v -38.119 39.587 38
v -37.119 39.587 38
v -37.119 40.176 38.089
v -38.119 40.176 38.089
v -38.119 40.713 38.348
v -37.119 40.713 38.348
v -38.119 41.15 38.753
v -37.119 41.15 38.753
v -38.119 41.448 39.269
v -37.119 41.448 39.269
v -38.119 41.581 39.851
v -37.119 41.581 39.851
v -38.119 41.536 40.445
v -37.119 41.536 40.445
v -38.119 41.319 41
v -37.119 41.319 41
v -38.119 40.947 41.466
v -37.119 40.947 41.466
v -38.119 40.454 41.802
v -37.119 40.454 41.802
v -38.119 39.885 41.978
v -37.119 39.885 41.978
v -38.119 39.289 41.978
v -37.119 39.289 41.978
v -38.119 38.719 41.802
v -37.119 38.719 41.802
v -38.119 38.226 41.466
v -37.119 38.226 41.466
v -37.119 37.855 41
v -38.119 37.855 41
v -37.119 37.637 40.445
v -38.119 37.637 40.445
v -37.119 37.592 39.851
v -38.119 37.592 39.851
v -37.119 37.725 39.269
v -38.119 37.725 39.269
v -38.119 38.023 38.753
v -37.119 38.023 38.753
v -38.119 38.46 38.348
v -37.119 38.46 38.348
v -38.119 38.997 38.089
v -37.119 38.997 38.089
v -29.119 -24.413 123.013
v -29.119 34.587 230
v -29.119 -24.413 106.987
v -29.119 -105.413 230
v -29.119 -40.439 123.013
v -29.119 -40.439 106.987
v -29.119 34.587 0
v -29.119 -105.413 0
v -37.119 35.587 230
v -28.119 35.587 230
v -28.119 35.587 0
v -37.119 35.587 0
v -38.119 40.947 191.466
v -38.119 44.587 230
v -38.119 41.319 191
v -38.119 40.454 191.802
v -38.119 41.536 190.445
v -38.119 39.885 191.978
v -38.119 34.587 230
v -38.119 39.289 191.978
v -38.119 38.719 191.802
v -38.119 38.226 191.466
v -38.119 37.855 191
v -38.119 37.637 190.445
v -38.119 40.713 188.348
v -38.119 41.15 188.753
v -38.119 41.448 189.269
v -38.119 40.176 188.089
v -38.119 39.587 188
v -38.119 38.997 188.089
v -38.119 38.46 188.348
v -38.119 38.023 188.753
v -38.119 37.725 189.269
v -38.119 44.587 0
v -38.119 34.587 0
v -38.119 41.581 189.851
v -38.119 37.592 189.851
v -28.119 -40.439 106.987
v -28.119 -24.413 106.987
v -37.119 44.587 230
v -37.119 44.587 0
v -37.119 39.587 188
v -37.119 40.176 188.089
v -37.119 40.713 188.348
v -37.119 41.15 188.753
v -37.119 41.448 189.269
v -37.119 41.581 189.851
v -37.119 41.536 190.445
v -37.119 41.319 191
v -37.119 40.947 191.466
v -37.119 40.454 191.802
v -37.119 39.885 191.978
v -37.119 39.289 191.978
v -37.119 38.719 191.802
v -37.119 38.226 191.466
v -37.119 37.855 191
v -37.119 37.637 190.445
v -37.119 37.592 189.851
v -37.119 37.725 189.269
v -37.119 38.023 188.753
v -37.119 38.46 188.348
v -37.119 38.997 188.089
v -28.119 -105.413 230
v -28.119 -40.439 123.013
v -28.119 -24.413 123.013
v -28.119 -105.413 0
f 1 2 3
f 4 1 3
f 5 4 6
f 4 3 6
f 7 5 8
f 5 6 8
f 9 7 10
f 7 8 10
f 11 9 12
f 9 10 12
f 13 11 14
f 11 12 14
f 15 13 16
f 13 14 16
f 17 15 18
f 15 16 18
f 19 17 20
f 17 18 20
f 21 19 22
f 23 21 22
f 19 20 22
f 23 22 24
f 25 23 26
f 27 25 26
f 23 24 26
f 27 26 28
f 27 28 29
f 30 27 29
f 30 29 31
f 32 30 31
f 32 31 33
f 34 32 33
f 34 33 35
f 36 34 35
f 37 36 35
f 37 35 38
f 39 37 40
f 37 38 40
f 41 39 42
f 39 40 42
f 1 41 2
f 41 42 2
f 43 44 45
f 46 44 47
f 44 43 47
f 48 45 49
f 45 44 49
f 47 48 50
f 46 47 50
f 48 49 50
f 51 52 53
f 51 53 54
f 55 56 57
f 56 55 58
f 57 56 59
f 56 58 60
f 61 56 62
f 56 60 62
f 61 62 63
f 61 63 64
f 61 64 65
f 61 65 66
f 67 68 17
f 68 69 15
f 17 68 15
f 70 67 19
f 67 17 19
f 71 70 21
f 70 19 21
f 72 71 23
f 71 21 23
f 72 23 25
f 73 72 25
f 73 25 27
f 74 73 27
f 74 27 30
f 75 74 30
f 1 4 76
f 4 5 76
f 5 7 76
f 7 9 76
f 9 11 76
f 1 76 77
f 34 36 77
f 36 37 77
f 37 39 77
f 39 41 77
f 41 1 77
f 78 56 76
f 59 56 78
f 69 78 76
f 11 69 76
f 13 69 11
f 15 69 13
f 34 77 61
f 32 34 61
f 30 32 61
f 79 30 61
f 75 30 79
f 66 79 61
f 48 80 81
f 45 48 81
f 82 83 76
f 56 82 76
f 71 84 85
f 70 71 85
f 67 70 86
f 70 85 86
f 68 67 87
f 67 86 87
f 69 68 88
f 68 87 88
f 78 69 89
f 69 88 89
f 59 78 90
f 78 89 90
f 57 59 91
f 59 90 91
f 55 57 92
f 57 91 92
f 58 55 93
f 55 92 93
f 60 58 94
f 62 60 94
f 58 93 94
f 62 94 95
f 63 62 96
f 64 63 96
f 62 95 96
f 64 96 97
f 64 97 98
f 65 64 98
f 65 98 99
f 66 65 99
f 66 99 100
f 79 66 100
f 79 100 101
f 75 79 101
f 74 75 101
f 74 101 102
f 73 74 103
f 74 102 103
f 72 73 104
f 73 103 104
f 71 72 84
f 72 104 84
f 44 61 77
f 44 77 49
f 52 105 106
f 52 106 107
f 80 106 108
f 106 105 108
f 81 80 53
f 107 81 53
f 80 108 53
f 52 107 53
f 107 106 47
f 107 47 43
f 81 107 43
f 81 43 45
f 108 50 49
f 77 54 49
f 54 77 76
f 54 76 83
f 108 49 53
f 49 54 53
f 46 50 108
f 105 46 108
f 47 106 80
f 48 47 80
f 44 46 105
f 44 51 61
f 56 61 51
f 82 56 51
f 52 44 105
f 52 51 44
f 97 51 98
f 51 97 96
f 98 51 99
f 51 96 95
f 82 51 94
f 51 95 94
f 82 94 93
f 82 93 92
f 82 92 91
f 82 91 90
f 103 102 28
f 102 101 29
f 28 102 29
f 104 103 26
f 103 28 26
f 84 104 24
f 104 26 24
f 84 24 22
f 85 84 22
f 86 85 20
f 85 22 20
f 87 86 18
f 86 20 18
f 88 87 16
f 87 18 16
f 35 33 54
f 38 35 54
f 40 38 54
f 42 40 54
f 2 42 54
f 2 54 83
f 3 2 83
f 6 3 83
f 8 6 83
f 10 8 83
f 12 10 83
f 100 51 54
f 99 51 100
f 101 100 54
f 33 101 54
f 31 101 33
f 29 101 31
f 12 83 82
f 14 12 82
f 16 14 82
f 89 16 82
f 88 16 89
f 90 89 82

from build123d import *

# Parameters (mm, degrees)
EXTRUIR_L_MINA1_DEPTH = 230
CROQUIS2_R            = 2
CORTAR_EXTRUIR1_DEPTH = 1
CROQUIS3_W            = 16.026065554
CROQUIS3_H            = 16.026065555
CORTAR_EXTRUIR2_DEPTH = 1


with BuildPart() as part:
    # Croquis1 → Extruir-Lámina1 (new body)
    with BuildSketch(Plane.XY):
        Polygon((-38.118921946, 44.586627311), (-38.118921946, 34.586627311), (-29.118921946, 34.586627311), (-29.118921946, -105.413372689), (-28.118921946, -105.413372689), (-28.118921946, 35.586627311), (-37.118921946, 35.586627311), (-37.118921946, 44.586627311), align=None)
    extrude(amount=EXTRUIR_L_MINA1_DEPTH)

    # Croquis2 → Cortar-Extruir1 (cut)
    with BuildSketch(Plane(origin=(-37.118921946, 0, 0), x_dir=(0, 0, -1), z_dir=(1, 0, 0))):
        with Locations((-190, 39.586627311)):
            Circle(CROQUIS2_R)
        with Locations((-40, 39.586627311)):
            Circle(CROQUIS2_R)
    extrude(amount=-CORTAR_EXTRUIR1_DEPTH, mode=Mode.SUBTRACT)

    # Croquis3 → Cortar-Extruir2 (cut)
    with BuildSketch(Plane(origin=(-28.118921946, 0, 0), x_dir=(0, 0, -1), z_dir=(1, 0, 0))):
        with Locations((-115, -32.426405467)):
            Rectangle(CROQUIS3_W, CROQUIS3_H)
    extrude(amount=-CORTAR_EXTRUIR2_DEPTH, mode=Mode.SUBTRACT)


solid = part.part
